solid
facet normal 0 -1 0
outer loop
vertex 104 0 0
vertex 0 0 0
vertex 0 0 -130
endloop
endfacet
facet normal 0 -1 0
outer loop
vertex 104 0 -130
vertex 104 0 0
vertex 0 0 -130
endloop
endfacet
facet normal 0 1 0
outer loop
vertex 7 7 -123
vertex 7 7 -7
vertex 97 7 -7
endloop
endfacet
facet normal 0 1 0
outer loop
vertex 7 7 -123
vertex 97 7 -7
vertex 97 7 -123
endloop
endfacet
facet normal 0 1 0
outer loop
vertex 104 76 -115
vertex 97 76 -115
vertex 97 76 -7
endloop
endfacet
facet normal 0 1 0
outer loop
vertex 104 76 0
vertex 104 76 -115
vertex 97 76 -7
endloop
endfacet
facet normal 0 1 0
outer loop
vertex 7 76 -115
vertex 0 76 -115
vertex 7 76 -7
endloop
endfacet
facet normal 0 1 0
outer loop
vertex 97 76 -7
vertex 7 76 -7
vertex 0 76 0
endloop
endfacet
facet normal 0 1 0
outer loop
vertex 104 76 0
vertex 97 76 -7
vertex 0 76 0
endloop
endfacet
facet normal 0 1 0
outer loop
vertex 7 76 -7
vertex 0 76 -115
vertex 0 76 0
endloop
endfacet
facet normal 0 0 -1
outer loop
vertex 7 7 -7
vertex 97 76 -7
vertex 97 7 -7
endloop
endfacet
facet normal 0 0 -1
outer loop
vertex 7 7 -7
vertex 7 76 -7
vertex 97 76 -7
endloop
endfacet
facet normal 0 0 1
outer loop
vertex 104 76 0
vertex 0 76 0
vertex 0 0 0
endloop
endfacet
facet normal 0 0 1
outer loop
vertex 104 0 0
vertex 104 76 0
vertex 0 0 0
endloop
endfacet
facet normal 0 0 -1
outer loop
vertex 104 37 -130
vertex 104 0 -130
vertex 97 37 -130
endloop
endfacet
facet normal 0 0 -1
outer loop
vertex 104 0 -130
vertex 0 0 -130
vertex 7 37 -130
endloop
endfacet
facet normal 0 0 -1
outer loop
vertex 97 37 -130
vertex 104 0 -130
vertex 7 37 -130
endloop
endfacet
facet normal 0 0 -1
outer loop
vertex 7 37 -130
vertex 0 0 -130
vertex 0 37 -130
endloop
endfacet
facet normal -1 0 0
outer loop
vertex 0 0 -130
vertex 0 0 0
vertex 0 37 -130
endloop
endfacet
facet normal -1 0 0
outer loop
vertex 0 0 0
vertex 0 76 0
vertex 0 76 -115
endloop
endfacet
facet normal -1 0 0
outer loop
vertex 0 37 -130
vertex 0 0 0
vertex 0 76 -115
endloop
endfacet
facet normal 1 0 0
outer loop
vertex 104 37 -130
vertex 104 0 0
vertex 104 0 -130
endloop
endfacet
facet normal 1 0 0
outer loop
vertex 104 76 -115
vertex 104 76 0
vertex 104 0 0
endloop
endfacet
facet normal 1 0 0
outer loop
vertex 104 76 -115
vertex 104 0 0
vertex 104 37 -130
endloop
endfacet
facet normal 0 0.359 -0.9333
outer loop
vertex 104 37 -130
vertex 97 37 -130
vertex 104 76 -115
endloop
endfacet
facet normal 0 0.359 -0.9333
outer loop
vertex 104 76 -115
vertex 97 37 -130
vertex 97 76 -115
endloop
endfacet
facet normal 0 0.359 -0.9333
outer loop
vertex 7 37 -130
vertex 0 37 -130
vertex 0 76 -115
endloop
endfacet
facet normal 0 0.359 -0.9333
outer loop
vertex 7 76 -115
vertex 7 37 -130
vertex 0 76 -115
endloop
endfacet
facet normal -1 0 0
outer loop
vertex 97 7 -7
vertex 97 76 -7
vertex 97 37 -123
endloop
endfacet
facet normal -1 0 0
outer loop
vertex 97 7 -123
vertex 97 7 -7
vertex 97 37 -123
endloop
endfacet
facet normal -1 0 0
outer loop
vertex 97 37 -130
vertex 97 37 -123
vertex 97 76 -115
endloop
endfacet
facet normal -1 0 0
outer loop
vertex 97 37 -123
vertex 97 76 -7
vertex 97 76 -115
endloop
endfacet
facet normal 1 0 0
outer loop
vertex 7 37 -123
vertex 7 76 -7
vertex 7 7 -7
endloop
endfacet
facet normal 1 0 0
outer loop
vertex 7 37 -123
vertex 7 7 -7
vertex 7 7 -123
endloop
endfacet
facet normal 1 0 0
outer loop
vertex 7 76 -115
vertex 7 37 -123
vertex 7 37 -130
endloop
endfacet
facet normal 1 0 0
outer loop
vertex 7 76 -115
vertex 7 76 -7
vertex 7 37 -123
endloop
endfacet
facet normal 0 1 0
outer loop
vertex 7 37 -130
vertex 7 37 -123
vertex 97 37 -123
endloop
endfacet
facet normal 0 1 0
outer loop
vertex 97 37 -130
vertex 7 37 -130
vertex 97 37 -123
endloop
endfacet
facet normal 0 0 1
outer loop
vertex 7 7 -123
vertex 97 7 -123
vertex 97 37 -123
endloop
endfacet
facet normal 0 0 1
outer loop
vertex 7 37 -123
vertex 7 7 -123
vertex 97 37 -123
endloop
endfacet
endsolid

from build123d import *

# Parameters (mm, degrees)
BOSS_EXTRUDE1_DEPTH = 104
SHELL1_T            = -7
SKETCH3_W           = 90
SKETCH3_H           = 18.2
CUT_EXTRUDE1_DEPTH  = 104


with BuildPart() as part:
    # Sketch1 → Boss-Extrude1 (new body)
    with BuildSketch(Plane(origin=(0, 0, 0), x_dir=(0, 0, -1), z_dir=(1, 0, 0))):
        Polygon((0, 0), (130, 0), (130, 37), (115, 76), (0, 76), align=None)
    extrude(amount=BOSS_EXTRUDE1_DEPTH)

    # Shell1
    shell1_openings = [part.faces().sort_by_distance(p)[0] for p in [
        (52, 76, -57.5),
        (52, 56.5, -122.5),
    ]]
    offset(amount=SHELL1_T, openings=shell1_openings, kind=Kind.INTERSECTION)

    # Sketch3 → Cut-Extrude1 (cut)
    with BuildSketch(Plane.XY.offset(-123)):
        with Locations((52, 46.1)):
            Rectangle(SKETCH3_W, SKETCH3_H)
    extrude(amount=-CUT_EXTRUDE1_DEPTH, mode=Mode.SUBTRACT)


solid = part.part
